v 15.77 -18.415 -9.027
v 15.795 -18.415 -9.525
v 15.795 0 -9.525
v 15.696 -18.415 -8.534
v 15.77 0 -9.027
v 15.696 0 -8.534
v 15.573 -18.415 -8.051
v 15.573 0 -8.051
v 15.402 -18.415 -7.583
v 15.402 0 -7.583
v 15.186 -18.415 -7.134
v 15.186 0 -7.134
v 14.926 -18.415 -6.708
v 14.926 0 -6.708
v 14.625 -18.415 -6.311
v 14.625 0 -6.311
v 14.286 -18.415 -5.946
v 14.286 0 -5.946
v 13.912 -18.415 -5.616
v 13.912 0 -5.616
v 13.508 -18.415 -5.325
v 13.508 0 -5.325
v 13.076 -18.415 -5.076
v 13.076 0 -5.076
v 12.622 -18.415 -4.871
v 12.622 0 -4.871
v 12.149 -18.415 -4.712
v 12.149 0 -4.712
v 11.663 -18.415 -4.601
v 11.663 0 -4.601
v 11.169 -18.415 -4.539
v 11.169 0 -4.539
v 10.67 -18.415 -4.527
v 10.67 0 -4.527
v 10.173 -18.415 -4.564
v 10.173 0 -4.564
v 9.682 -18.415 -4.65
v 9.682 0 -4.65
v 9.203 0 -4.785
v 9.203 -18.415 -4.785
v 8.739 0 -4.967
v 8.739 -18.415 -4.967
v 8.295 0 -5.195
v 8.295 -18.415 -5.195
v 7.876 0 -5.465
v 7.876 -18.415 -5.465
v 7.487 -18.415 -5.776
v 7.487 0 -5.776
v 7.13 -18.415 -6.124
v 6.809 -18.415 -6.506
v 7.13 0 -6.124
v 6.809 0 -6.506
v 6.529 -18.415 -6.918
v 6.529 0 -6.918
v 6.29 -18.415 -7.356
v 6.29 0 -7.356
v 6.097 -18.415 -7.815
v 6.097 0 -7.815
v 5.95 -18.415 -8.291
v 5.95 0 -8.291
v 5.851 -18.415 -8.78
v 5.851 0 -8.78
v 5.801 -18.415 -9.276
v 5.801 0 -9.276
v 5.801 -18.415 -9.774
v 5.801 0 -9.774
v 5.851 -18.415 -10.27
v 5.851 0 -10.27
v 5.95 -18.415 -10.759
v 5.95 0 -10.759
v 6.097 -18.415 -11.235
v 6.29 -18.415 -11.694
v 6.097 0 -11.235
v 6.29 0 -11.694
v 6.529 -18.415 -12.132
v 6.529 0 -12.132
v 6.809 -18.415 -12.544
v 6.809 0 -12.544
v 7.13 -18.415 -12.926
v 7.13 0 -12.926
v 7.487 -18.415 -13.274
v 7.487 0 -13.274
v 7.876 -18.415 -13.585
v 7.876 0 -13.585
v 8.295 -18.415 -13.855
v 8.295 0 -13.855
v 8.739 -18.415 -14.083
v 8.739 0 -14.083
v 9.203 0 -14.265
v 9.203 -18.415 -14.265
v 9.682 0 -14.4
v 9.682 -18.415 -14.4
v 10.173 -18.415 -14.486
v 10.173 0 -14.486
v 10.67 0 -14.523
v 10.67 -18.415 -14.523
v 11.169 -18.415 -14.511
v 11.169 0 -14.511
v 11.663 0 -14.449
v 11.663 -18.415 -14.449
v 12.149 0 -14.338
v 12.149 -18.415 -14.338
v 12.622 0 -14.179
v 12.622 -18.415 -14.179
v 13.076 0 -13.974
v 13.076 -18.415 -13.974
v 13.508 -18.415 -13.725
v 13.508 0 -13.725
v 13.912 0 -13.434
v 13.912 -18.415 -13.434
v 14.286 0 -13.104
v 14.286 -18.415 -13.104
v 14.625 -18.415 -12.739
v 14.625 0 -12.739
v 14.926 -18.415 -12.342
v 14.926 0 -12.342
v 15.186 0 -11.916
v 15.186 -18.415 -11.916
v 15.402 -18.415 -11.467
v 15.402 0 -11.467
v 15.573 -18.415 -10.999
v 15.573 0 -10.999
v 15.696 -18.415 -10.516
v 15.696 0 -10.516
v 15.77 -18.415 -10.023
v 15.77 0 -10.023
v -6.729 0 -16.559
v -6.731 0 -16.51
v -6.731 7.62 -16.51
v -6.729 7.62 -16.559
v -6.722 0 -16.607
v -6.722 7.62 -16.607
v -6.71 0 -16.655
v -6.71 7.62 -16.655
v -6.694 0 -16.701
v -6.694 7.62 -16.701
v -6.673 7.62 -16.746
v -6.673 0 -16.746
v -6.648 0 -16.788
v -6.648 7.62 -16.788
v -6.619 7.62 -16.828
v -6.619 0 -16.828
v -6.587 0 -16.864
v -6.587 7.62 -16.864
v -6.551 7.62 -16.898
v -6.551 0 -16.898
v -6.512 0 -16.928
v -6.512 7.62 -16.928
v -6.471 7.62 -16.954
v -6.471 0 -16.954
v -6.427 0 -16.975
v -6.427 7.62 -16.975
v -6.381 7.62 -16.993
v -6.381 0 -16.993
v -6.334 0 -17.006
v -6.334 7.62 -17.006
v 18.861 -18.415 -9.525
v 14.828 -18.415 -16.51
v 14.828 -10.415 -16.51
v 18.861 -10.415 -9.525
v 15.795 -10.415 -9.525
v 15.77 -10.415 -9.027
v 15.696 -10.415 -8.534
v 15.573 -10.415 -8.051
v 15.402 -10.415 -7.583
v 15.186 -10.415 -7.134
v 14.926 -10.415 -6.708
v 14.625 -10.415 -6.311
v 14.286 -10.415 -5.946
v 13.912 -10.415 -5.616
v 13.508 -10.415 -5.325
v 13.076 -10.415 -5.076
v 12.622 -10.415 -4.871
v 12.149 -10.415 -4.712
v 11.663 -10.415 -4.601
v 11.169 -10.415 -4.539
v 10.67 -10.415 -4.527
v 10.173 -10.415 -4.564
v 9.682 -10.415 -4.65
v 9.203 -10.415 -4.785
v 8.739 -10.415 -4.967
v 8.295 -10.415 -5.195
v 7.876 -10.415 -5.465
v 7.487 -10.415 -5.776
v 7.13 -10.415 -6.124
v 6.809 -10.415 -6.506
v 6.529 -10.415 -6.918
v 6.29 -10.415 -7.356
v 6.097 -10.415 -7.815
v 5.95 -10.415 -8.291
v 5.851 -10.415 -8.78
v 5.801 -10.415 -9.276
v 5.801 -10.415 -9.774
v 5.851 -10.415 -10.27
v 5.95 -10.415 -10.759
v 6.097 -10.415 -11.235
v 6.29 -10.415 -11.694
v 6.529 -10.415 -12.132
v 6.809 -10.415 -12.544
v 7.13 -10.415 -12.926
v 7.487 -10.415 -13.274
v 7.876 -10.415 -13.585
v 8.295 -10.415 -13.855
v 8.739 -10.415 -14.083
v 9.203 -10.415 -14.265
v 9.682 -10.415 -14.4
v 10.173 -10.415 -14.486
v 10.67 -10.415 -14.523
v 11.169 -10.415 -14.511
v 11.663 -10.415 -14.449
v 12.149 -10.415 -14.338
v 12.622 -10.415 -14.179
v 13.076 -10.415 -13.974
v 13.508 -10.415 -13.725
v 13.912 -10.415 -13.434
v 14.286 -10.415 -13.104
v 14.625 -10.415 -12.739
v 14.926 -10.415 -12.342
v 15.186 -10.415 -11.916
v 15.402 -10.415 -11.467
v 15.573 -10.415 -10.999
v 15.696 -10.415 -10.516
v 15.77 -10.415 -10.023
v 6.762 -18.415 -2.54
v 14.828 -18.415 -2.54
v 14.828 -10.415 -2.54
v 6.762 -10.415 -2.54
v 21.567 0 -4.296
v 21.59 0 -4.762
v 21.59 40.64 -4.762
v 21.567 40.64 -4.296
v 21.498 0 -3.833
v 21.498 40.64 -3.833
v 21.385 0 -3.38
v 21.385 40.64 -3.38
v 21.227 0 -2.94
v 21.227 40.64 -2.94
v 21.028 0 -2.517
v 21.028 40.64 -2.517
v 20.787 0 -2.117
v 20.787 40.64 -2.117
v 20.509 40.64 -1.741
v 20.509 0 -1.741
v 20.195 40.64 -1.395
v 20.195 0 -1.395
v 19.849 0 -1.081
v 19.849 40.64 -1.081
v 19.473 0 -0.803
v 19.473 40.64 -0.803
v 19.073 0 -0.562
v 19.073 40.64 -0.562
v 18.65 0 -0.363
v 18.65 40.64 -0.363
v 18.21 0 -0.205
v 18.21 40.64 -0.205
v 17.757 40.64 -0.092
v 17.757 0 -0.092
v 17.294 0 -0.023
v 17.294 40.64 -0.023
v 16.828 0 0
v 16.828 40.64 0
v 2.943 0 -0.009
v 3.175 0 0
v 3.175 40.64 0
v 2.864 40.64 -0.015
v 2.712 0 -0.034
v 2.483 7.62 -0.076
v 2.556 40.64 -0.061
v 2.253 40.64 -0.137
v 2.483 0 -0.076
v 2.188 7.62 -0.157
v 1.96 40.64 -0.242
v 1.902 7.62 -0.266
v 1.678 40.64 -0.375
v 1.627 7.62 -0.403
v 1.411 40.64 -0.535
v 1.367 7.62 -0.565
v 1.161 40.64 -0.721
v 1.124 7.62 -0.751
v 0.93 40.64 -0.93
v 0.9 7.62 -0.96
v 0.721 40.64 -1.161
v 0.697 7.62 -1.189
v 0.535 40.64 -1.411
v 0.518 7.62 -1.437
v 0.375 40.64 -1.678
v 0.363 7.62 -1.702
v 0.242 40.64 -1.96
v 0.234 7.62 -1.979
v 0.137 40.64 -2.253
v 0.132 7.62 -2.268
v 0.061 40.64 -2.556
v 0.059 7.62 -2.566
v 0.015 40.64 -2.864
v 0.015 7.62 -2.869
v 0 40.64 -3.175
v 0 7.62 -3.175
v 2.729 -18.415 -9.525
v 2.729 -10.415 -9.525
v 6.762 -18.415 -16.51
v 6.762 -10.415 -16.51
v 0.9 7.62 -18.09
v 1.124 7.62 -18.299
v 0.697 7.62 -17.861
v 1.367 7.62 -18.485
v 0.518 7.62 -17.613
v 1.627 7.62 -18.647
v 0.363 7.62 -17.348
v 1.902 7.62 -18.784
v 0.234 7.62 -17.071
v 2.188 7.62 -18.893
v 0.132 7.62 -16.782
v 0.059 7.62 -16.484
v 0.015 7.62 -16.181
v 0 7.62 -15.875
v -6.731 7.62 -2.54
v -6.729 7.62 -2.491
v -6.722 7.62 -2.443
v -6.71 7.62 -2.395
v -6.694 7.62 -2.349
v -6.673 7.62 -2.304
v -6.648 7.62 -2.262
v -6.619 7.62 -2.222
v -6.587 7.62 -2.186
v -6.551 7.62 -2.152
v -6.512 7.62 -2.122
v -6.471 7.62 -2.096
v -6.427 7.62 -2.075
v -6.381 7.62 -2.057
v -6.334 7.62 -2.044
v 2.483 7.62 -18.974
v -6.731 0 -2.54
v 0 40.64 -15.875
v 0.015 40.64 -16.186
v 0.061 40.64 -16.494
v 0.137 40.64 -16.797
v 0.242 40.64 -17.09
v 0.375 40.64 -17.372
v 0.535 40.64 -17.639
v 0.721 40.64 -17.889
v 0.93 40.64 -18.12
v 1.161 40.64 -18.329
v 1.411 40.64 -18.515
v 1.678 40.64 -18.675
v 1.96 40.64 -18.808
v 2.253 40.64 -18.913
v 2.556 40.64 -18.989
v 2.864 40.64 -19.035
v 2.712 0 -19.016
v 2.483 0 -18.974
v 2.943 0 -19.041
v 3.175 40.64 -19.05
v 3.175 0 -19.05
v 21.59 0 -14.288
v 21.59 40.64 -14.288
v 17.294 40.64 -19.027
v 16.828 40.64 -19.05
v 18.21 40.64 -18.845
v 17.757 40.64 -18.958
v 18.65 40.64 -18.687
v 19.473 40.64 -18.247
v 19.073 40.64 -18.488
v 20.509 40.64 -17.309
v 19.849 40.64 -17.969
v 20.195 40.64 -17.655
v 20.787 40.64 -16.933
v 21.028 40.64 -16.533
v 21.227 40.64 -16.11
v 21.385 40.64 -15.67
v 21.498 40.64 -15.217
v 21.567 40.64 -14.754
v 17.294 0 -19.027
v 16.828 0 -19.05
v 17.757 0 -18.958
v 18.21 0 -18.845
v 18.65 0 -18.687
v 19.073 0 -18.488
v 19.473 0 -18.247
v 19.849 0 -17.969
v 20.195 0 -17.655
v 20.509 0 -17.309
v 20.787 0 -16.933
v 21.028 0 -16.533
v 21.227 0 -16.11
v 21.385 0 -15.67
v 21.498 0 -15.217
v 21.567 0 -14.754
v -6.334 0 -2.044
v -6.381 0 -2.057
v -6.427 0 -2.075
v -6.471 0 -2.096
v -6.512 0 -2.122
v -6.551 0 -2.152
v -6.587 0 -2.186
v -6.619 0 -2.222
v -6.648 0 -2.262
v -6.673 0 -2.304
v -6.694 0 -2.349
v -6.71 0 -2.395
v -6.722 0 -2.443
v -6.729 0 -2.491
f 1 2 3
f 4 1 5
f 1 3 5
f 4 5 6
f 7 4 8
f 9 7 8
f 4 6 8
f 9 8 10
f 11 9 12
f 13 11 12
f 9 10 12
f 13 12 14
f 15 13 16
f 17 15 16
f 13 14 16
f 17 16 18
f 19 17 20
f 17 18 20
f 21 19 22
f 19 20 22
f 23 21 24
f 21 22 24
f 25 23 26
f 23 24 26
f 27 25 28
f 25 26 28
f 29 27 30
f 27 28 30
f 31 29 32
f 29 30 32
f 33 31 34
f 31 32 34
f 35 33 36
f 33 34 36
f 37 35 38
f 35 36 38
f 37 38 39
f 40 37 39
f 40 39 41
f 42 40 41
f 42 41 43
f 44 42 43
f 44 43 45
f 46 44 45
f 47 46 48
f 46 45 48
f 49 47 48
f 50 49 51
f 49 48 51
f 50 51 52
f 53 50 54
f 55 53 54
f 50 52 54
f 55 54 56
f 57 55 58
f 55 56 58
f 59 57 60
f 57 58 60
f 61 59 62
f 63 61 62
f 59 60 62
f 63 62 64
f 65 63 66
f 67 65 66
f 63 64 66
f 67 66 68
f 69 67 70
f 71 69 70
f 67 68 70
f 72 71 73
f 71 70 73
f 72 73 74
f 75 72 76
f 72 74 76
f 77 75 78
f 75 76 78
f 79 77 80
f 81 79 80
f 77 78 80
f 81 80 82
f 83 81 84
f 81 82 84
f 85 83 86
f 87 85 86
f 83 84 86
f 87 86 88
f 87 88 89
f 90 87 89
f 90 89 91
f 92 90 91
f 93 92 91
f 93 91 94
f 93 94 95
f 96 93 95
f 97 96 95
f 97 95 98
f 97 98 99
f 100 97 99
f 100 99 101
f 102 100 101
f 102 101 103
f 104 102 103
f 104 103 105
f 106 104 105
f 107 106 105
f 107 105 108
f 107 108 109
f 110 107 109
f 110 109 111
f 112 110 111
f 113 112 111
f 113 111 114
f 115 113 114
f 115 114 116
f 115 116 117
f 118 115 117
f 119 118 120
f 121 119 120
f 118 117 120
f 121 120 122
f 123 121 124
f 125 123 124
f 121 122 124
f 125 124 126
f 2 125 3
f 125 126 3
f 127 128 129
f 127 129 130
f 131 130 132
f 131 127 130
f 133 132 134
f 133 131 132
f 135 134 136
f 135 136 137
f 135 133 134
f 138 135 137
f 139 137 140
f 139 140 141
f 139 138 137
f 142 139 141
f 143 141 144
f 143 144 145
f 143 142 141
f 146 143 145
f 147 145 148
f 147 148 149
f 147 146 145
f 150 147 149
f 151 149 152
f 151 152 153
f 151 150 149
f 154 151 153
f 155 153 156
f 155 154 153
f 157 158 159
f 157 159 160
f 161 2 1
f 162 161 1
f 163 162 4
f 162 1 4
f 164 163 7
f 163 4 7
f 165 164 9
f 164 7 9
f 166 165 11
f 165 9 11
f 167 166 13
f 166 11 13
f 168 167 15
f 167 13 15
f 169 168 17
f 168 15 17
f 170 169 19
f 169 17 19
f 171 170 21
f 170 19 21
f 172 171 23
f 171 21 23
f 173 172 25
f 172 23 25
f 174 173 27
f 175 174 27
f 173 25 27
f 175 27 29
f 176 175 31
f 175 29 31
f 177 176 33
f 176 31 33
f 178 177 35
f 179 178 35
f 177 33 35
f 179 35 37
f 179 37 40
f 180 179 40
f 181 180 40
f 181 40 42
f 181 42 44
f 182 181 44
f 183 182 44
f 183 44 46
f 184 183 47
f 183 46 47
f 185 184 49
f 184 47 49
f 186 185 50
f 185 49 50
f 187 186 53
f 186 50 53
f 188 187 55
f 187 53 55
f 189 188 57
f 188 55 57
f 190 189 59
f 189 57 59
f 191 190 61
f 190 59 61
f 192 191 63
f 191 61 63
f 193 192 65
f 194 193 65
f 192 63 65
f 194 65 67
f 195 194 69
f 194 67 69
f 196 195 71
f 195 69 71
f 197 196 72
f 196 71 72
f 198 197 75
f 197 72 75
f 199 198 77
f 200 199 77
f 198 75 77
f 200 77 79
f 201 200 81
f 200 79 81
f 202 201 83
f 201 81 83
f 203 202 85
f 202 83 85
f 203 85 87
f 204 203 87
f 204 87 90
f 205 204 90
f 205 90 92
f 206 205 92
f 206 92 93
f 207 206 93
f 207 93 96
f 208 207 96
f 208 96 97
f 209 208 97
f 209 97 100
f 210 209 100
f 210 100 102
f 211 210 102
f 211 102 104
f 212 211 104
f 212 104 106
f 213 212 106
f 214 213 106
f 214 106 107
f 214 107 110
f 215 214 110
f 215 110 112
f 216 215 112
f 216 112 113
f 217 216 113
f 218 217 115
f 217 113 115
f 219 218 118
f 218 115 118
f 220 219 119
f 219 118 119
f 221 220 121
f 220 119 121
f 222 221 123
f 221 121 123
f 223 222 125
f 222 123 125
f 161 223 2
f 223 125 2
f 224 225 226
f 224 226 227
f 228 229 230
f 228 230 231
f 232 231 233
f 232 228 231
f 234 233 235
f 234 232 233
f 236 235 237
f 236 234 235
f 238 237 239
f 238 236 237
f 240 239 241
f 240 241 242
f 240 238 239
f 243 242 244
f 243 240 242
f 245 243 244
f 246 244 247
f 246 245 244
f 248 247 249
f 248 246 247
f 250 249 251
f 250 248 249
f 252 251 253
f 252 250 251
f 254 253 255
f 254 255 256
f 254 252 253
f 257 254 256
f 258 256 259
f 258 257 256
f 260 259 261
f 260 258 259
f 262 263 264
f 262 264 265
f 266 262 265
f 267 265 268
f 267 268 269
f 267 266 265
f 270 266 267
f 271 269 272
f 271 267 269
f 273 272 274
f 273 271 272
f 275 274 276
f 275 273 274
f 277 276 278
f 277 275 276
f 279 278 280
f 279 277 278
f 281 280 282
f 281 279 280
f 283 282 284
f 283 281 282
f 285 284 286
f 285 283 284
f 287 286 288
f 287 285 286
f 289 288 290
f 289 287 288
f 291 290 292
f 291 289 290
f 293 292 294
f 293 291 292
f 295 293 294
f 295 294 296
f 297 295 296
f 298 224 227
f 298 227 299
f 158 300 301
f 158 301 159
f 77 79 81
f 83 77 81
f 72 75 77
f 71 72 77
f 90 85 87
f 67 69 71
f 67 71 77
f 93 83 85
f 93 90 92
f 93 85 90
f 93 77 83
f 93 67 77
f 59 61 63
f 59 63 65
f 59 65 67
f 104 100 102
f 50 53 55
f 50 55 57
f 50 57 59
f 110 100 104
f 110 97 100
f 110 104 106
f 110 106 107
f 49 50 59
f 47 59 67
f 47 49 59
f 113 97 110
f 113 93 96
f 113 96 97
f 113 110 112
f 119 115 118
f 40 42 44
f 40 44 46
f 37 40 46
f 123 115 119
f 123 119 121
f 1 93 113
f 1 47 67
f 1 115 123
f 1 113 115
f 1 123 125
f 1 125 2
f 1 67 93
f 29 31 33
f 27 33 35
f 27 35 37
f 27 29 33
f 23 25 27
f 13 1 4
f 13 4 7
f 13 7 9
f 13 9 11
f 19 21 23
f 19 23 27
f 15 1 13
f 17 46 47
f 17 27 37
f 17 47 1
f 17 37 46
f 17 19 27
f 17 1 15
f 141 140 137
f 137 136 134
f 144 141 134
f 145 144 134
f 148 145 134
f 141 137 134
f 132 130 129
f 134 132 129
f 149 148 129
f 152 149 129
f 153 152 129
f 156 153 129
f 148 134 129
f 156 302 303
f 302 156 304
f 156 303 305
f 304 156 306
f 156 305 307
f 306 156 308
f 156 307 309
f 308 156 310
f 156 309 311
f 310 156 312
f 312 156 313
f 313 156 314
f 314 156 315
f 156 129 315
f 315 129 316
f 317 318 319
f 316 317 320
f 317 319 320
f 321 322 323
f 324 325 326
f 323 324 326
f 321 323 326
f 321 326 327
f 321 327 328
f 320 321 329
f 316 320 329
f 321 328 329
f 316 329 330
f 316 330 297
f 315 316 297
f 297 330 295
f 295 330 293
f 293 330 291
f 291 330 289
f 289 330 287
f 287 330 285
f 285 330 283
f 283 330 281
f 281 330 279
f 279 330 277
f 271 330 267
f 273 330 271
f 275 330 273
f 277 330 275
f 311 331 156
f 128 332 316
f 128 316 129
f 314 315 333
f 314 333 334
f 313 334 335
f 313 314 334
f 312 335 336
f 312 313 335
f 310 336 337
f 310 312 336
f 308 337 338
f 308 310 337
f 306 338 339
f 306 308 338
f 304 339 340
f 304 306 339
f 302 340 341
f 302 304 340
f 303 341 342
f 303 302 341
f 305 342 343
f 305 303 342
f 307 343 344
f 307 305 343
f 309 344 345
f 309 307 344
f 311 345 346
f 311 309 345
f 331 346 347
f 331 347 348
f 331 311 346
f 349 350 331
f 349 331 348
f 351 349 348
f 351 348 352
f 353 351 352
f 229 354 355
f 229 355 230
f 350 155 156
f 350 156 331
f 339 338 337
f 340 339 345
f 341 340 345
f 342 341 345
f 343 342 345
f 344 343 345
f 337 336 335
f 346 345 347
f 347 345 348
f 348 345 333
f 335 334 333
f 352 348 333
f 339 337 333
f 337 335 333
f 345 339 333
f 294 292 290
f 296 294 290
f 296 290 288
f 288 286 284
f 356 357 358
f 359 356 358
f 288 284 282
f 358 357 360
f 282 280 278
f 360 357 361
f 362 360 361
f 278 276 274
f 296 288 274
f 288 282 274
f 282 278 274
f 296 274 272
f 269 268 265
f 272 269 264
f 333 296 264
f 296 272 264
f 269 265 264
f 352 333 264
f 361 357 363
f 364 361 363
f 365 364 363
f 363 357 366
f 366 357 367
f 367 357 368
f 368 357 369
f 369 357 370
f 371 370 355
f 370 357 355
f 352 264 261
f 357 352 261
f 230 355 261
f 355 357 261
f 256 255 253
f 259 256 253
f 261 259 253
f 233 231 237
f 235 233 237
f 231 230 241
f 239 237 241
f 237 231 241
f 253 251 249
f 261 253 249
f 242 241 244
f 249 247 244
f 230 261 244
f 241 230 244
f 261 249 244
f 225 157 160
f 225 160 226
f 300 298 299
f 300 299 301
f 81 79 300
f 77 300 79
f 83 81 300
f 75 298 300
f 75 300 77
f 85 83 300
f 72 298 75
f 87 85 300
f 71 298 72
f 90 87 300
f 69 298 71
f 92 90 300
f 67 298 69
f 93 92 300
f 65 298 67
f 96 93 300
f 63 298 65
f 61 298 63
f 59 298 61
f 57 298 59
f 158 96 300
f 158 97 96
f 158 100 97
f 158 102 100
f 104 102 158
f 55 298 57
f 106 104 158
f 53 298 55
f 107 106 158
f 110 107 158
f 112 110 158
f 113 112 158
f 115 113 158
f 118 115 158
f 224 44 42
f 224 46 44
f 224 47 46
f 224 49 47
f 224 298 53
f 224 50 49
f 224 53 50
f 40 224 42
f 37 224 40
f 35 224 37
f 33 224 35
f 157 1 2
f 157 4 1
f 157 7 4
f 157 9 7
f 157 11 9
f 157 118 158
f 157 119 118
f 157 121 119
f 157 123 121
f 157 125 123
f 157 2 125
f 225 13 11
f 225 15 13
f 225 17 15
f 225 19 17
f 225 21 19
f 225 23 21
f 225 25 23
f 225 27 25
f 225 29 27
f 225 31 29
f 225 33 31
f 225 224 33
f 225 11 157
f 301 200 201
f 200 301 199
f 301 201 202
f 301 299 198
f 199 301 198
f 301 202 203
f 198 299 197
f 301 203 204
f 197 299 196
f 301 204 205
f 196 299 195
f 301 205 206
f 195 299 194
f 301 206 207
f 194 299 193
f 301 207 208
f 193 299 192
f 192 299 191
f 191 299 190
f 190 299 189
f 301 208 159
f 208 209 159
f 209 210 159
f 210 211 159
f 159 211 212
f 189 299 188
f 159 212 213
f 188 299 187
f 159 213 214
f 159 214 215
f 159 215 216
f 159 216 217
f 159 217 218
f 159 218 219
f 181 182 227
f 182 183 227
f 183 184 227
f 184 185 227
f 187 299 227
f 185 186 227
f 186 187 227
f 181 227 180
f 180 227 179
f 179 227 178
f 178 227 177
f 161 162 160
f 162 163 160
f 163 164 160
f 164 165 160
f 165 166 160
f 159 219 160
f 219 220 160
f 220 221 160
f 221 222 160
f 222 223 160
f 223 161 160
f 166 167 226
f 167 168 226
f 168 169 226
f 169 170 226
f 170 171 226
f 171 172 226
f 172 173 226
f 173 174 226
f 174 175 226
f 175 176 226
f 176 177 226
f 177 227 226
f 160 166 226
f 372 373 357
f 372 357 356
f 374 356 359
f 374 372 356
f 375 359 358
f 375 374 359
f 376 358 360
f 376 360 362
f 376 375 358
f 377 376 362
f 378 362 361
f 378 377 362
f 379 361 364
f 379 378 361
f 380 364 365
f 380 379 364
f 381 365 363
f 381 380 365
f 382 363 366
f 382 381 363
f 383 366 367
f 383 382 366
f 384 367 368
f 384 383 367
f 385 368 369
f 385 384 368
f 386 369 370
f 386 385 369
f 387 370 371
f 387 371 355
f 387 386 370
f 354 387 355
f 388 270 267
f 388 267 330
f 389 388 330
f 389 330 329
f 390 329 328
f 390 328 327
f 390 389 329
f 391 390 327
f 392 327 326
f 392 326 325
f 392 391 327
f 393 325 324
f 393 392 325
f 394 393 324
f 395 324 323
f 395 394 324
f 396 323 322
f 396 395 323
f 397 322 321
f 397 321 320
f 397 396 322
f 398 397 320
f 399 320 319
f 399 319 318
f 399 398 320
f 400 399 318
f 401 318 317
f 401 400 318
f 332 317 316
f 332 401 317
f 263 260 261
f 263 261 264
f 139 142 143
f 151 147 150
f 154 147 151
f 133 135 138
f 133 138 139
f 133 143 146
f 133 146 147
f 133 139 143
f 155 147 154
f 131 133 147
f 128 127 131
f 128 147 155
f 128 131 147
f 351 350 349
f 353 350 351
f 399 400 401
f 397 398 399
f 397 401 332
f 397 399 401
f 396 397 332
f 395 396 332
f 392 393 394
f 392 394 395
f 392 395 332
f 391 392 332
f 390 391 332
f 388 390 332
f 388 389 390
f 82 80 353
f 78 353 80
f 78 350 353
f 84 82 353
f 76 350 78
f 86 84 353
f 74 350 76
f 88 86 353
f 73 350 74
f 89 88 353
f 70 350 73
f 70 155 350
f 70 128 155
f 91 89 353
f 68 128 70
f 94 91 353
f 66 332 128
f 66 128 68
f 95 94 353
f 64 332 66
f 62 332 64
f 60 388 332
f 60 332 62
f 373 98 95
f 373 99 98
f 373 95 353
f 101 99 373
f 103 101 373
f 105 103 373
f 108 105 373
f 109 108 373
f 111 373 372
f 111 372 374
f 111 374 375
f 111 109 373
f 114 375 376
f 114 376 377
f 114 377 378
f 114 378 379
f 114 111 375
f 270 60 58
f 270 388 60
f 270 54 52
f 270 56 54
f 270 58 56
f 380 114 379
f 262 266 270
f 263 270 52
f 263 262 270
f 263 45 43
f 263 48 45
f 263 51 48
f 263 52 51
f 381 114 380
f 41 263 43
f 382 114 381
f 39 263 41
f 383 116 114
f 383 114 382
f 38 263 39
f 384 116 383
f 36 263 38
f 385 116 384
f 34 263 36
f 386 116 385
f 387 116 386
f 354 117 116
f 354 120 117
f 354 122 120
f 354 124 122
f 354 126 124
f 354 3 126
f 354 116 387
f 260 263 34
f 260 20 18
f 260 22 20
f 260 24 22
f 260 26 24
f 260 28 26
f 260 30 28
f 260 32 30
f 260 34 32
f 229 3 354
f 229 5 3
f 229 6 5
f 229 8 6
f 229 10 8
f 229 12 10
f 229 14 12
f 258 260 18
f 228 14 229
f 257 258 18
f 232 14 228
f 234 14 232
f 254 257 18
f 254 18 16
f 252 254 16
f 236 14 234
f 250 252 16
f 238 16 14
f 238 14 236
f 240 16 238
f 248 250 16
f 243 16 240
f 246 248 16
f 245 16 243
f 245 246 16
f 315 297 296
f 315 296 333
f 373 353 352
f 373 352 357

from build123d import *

# Parameters (mm, degrees)
F1_DEPTH = 40.64
F2_R     = 5
F3_DEPTH = 18.415
F5_DEPTH = 7.62
F6_R     = 5
F7_DEPTH = 8


with BuildPart() as f1:
    # F0 (on Front) → F1 (new body)
    with BuildSketch(Plane.XZ):
        with BuildLine():
            Line((16.8275, 0), (3.175, 0))
            ThreePointArc((3.175, 0), (0.9299359697, -0.9299359697), (0, -3.175))
            Line((0, -3.175), (0, -15.875))
            ThreePointArc((0, -15.875), (0.9299359697, -18.1200640303), (3.175, -19.05))
            Line((3.175, -19.05), (16.8275, -19.05))
            ThreePointArc((16.8275, -19.05), (20.1950960454, -17.6550960454), (21.59, -14.2875))
            Line((21.59, -14.2875), (21.59, -4.7625))
            ThreePointArc((21.59, -4.7625), (20.1950960454, -1.3949039546), (16.8275, 0))
        make_face()
    extrude(amount=-F1_DEPTH)

    # F2 (on face) → F3 (join)
    with BuildSketch(Plane.XZ):
        with Locations((10.795, -9.525)):
            Circle(F2_R)
    extrude(amount=F3_DEPTH)

    # F4 (on face) → F5 (join)
    with BuildSketch(Plane.XZ):
        with BuildLine():
            ThreePointArc((0, -3.175), (0.6974430438, -1.1894682001), (2.4833615928, -0.0762484266))
            Line((2.4833615928, -0.0762484266), (-6.3336621452, -2.0441997483))
            ThreePointArc((-6.3336621452, -2.0441997483), (-6.619409113, -2.222314912), (-6.731, -2.54))
            Line((-6.731, -2.54), (-6.731, -16.51))
            ThreePointArc((-6.731, -16.51), (-6.619409113, -16.827685088), (-6.3336621452, -17.0058002517))
            Line((-6.3336621452, -17.0058002517), (2.4833615928, -18.9737515734))
            ThreePointArc((2.4833615928, -18.9737515734), (0.6974430438, -17.8605317999), (0, -15.875))
            Line((0, -15.875), (0, -3.175))
        make_face()
    extrude(amount=-F5_DEPTH)


with BuildPart() as f7:
    # F6 (on face) → F7 (new body)
    with BuildSketch(Plane.XZ.offset(18.415)):
        Polygon((14.8277916303, -2.54), (6.7622083697, -2.54), (2.7294167394, -9.525), (6.7622083697, -16.51), (14.8277916303, -16.51), (18.8605832606, -9.525), align=None)
        with Locations((10.795, -9.525)):
            Circle(F6_R, mode=Mode.SUBTRACT)
    extrude(amount=-F7_DEPTH)


solid = Compound([f1.part, f7.part])
